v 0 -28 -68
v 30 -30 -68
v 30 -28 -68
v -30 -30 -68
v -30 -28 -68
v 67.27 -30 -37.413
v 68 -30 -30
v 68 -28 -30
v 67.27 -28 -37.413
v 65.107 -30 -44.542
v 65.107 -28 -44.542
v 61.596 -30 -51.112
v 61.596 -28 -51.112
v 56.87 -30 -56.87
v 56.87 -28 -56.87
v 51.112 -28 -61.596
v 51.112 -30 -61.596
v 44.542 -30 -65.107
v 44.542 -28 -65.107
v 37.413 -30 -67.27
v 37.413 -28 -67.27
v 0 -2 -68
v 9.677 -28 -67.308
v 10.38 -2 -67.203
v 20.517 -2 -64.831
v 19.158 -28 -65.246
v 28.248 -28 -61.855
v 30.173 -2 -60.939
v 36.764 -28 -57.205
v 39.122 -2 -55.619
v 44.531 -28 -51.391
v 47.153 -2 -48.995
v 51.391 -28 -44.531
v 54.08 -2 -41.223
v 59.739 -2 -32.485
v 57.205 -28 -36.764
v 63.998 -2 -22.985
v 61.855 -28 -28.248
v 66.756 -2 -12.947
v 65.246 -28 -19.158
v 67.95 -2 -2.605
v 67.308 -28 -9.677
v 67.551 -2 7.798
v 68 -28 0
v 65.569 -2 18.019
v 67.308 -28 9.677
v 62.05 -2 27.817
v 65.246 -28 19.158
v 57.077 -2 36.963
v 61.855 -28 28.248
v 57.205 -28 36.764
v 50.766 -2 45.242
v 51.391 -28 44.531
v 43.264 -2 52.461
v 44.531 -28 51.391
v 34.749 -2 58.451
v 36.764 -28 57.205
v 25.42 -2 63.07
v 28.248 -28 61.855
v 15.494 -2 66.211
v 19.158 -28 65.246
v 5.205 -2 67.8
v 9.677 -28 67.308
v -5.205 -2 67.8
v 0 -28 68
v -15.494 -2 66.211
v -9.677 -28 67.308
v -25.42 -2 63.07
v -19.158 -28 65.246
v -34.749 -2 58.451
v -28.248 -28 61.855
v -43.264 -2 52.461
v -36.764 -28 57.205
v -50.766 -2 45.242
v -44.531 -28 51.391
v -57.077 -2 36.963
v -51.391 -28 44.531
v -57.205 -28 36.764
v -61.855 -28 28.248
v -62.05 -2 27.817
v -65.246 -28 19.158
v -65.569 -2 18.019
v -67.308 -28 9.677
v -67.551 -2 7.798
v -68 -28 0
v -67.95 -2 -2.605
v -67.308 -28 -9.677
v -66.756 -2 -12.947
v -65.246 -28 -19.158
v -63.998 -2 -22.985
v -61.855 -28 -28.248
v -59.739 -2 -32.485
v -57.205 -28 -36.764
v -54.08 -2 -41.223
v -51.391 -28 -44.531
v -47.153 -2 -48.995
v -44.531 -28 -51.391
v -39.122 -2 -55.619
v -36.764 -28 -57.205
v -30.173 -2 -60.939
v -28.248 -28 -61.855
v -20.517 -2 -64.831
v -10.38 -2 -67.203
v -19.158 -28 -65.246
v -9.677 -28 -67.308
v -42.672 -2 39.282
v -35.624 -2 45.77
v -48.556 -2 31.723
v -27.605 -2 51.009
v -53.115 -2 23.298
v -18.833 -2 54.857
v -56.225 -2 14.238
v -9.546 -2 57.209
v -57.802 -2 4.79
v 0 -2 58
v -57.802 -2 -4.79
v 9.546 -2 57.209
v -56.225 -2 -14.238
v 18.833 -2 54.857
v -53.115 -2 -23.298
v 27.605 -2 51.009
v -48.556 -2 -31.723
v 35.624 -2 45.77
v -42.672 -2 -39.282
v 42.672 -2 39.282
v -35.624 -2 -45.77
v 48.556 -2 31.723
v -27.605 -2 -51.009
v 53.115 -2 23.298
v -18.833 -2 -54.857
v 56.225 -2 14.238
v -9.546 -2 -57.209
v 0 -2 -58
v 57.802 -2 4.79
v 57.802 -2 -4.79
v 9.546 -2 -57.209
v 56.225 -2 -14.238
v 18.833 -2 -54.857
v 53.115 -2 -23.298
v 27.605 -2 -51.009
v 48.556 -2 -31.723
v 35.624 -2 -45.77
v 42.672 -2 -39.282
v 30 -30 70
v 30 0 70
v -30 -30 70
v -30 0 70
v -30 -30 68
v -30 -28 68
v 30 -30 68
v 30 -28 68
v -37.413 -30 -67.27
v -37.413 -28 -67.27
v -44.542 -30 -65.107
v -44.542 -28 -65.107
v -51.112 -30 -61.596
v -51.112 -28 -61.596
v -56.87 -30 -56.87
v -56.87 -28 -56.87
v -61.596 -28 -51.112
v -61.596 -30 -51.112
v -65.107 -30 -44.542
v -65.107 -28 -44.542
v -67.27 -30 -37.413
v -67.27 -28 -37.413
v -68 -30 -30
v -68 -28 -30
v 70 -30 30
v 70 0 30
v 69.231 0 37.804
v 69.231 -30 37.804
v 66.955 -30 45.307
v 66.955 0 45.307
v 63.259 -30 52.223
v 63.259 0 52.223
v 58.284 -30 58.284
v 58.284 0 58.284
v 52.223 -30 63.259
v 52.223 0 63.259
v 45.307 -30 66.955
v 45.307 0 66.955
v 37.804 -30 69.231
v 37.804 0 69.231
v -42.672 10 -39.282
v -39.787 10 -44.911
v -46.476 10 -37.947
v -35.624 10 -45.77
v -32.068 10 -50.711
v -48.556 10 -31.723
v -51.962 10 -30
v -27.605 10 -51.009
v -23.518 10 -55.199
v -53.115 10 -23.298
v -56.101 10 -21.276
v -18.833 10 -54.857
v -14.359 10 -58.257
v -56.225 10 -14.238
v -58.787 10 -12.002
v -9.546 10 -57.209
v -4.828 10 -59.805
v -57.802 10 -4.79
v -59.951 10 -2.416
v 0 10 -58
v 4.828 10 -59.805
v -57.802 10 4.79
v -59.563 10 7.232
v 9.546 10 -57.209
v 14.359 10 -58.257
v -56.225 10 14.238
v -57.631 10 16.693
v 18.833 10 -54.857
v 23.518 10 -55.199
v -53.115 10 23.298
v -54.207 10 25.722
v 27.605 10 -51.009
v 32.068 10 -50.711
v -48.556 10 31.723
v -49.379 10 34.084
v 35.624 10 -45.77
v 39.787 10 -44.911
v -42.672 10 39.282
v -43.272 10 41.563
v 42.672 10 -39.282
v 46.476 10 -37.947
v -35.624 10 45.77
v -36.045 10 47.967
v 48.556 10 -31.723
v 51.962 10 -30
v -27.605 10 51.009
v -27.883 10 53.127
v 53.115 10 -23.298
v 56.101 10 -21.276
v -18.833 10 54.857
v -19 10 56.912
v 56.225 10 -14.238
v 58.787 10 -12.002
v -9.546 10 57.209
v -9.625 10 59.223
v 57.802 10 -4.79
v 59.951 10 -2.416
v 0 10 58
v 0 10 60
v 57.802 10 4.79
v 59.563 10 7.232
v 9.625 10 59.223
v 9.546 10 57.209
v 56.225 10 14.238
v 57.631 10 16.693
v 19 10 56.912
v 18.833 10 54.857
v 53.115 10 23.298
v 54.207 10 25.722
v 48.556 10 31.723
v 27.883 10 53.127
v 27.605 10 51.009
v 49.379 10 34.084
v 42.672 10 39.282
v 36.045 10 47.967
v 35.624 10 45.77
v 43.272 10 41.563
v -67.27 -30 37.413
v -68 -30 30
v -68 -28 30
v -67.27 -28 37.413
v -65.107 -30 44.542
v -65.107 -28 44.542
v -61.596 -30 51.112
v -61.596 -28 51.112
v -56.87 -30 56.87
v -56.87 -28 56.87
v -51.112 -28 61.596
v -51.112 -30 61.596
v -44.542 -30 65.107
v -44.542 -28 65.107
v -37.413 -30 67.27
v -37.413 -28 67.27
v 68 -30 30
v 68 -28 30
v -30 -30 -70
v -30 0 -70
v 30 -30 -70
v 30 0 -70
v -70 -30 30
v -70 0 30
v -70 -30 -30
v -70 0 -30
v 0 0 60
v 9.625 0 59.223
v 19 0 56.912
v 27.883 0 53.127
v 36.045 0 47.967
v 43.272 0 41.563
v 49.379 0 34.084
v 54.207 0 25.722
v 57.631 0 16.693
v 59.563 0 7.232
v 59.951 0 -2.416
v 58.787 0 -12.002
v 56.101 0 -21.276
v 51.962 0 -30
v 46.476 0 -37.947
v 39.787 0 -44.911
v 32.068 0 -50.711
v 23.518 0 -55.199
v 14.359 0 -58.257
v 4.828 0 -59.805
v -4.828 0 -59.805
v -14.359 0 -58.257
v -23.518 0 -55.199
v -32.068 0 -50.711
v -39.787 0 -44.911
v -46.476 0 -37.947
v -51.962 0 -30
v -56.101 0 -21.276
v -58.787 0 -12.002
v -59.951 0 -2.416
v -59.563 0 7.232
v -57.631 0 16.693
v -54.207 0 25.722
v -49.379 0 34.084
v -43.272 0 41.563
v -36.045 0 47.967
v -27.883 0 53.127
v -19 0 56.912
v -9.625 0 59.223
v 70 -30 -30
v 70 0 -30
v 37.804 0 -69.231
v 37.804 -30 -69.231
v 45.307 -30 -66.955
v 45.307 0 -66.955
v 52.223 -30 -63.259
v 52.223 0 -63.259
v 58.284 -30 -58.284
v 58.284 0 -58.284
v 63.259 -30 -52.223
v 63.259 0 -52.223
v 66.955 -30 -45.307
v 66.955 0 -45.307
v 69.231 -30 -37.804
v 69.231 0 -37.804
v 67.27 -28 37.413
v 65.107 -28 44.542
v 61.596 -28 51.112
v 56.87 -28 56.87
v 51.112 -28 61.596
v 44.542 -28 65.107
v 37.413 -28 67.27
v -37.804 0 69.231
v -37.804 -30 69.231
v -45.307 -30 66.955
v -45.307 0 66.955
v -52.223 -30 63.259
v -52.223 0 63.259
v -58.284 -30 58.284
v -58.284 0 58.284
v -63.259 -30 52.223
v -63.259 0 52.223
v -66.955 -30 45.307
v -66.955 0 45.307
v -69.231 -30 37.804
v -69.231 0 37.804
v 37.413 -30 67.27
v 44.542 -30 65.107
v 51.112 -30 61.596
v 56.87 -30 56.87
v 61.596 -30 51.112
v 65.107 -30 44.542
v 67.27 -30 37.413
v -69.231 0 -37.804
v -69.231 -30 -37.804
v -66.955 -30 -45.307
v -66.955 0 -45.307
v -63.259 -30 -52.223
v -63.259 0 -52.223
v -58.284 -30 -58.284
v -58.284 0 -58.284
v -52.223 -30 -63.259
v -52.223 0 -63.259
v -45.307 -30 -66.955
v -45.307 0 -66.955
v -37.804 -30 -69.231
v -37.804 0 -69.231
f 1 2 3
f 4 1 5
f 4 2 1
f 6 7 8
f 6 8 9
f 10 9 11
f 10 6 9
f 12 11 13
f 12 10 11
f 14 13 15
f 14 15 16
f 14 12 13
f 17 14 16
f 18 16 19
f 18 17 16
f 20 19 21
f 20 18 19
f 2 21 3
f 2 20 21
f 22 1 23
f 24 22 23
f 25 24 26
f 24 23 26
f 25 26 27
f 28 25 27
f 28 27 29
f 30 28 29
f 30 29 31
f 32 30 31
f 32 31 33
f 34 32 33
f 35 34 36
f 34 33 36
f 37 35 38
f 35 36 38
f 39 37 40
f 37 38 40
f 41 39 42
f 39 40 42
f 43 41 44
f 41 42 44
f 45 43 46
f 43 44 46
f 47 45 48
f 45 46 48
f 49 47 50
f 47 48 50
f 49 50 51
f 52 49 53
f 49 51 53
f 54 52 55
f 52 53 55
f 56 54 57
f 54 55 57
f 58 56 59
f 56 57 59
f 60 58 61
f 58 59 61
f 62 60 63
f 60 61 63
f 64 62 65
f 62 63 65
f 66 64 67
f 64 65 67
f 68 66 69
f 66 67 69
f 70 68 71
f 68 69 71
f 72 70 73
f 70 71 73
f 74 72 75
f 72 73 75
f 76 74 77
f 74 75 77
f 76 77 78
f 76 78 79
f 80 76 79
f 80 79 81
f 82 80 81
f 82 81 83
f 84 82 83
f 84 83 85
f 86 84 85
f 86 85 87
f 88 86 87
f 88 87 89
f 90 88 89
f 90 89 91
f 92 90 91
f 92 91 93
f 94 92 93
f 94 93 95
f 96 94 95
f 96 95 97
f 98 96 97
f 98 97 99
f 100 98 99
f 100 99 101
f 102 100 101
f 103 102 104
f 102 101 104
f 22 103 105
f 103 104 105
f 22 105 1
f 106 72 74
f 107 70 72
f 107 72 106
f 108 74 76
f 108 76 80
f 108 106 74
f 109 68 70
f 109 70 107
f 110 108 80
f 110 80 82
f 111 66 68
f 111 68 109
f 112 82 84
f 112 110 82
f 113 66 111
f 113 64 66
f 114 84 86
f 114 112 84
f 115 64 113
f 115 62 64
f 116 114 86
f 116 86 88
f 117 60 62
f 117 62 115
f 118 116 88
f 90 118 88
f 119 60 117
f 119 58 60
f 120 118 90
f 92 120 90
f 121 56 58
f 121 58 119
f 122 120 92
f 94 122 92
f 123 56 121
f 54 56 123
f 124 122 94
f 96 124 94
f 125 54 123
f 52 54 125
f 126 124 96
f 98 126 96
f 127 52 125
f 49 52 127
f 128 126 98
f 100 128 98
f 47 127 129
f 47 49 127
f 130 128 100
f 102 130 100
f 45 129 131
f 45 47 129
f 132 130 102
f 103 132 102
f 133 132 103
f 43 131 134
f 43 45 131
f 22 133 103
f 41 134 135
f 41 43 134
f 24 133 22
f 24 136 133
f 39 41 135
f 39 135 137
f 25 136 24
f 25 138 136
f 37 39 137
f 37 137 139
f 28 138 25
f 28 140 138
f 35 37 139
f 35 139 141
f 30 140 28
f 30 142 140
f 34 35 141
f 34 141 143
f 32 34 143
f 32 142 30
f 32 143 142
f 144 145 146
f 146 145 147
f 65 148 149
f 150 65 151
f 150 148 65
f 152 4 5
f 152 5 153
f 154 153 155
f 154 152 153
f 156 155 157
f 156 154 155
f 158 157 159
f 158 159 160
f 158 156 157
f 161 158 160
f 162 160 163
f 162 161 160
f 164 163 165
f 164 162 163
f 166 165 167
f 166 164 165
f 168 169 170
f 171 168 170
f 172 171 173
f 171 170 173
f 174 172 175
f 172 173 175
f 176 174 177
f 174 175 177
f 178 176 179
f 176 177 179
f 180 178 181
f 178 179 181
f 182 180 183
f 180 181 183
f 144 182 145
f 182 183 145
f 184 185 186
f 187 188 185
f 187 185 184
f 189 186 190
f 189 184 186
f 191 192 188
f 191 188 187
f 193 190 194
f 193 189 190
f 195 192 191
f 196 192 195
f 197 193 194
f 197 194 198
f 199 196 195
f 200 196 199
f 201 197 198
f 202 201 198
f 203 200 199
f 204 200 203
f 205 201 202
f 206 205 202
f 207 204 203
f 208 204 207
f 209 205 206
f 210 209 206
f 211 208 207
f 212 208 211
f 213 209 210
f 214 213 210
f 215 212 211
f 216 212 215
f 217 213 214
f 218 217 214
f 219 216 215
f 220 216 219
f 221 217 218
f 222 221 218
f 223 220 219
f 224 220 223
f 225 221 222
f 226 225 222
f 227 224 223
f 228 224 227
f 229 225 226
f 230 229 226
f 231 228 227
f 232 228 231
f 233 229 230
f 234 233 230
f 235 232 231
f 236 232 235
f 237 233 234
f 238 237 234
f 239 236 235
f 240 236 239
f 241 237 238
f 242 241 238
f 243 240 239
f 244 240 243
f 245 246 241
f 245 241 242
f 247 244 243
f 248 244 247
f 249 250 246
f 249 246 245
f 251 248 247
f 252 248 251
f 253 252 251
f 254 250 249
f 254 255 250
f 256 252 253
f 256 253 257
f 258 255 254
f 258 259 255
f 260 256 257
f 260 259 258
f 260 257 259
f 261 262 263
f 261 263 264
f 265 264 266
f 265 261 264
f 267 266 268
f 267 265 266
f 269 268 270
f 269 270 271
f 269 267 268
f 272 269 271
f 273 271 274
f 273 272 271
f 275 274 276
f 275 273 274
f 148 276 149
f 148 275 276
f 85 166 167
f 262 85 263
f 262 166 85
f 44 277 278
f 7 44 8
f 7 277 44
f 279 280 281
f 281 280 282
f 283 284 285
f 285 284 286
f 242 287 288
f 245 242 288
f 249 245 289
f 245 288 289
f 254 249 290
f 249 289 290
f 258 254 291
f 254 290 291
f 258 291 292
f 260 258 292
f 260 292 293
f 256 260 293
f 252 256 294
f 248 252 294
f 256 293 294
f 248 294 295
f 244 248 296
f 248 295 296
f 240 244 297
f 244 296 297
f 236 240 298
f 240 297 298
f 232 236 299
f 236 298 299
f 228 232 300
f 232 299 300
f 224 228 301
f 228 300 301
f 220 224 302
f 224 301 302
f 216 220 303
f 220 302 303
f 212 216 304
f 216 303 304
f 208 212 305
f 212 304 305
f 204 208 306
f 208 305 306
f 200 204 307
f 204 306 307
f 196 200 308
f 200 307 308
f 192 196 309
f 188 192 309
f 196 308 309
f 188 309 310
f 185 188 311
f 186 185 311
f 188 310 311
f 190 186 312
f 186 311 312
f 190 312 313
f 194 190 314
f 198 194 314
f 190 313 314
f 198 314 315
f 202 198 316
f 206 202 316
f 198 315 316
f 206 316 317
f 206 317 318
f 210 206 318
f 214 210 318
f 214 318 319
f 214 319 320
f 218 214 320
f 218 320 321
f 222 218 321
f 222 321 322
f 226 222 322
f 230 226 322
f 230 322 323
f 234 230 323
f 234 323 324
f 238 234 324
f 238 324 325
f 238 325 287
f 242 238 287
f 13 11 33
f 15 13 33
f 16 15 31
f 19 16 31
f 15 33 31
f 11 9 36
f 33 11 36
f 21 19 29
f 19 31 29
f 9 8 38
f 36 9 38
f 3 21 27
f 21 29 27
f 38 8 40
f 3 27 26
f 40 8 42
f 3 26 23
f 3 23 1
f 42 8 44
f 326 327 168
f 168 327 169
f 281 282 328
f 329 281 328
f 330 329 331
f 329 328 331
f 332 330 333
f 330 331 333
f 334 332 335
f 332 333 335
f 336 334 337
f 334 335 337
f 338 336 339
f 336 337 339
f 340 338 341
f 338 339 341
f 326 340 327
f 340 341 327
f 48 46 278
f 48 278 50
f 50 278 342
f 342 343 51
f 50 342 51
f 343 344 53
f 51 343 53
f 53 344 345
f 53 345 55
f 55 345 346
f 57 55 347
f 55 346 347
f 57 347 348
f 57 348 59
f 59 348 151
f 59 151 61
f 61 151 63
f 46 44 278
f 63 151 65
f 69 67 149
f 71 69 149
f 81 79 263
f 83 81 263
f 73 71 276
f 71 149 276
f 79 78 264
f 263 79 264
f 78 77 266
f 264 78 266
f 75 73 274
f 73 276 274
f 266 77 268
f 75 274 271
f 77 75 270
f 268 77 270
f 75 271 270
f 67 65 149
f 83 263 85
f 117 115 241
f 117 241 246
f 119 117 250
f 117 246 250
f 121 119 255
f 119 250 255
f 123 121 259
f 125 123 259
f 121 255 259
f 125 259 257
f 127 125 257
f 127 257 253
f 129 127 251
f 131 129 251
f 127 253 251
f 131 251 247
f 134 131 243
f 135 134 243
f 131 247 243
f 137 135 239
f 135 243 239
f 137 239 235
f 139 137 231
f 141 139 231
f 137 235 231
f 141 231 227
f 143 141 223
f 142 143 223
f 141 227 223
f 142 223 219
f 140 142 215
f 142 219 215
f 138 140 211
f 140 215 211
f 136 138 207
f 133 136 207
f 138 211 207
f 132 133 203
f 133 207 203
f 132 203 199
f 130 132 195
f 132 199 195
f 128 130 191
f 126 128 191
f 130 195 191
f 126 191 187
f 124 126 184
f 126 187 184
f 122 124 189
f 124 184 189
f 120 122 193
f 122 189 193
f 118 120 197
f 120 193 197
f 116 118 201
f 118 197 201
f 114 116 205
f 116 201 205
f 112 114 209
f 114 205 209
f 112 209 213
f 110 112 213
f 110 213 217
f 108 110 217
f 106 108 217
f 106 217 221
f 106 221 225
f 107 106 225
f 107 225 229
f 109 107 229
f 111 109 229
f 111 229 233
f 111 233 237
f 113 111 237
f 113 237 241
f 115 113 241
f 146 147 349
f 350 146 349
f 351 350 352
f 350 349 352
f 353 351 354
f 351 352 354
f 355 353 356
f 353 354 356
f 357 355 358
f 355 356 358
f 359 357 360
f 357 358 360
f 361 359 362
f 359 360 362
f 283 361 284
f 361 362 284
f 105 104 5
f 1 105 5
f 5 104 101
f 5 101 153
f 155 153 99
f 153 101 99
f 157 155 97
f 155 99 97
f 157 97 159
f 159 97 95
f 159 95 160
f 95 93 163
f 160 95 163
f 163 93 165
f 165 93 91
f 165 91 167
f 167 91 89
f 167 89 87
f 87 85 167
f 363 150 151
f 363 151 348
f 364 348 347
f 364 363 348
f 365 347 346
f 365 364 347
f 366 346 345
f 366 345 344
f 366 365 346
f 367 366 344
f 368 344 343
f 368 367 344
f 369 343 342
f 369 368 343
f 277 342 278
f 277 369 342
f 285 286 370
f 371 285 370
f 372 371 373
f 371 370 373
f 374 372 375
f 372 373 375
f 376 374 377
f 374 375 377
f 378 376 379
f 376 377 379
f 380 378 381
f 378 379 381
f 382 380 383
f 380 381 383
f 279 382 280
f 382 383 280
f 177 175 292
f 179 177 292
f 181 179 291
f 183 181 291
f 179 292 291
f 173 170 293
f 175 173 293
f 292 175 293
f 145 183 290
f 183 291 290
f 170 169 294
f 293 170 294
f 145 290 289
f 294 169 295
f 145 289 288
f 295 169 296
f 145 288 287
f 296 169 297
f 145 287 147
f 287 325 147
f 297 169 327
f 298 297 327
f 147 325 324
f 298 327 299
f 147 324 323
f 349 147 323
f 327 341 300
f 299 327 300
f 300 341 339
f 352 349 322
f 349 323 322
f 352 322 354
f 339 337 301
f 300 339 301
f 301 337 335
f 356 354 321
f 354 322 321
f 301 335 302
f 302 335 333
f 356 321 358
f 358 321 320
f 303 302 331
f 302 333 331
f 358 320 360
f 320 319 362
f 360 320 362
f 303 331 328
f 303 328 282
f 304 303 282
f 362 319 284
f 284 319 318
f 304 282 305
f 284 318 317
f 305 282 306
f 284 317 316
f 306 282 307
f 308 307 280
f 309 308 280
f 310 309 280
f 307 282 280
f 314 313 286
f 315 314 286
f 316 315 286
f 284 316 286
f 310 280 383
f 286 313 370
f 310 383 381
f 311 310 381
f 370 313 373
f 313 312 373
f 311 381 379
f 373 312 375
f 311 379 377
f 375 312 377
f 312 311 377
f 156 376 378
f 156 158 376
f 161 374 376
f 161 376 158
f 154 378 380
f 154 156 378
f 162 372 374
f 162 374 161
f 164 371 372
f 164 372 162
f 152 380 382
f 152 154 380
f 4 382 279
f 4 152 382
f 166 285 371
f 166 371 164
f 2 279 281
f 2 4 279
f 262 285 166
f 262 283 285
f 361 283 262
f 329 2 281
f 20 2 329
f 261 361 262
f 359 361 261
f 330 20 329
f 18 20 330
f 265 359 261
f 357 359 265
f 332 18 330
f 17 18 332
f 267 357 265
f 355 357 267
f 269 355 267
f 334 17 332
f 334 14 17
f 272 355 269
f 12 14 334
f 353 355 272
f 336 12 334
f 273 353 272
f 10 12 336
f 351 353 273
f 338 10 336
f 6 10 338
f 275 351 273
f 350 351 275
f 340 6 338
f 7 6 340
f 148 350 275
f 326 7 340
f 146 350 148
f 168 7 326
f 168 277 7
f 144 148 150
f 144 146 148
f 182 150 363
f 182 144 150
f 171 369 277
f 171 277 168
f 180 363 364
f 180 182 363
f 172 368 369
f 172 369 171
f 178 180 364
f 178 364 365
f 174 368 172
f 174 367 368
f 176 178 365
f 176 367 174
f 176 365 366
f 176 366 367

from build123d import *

# Parameters (mm, degrees)
BOSS_EXTRUDE1_DEPTH = 40
SKETCH2_R           = 60
BOSS_EXTRUDE2_DEPTH = 10
SKETCH3_R           = 58
CUT_EXTRUDE1_DEPTH  = 12
SKETCH5_R           = 68
CUT_EXTRUDE3_DEPTH  = 38
SKETCH7_W           = 152.426139127
SKETCH7_H           = 144.716969628
CUT_EXTRUDE4_DEPTH  = 10
CUT_EXTRUDE6_DEPTH  = 2


with BuildPart() as part:
    # Sketch1 → Boss-Extrude1 (new body)
    with BuildSketch(Plane(origin=(0, 0, 0), x_dir=(1, 0, 0), z_dir=(0, 1, 0))):
        with BuildLine():
            Line((-30, 70), (30, 70))
            ThreePointArc((30, 70), (58.284271247, 58.284271247), (70, 30))
            Line((70, 30), (70, -30))
            ThreePointArc((70, -30), (58.284271247, -58.284271247), (30, -70))
            Line((30, -70), (-30, -70))
            ThreePointArc((-30, -70), (-58.284271247, -58.284271247), (-70, -30))
            Line((-70, -30), (-70, 30))
            ThreePointArc((-70, 30), (-58.284271247, 58.284271247), (-30, 70))
        make_face()
    extrude(amount=-BOSS_EXTRUDE1_DEPTH)

    # Sketch2 → Boss-Extrude2 (add)
    with BuildSketch(Plane(origin=(0, 0, 0), x_dir=(1, 0, 0), z_dir=(0, 1, 0))):
        with Locations(Location((0, 0, 0), (0, 0, 270))):
            Circle(SKETCH2_R)
    extrude(amount=BOSS_EXTRUDE2_DEPTH)

    # Sketch3 → Cut-Extrude1 (cut)
    with BuildSketch(Plane(origin=(0, 10, 0), x_dir=(1, 0, 0), z_dir=(0, 1, 0))):
        with Locations(Location((0, 0, 0), (0, 0, 270))):
            Circle(SKETCH3_R)
    extrude(amount=-CUT_EXTRUDE1_DEPTH, mode=Mode.SUBTRACT)

    # Sketch5 → Cut-Extrude3 (cut)
    with BuildSketch(Plane.XZ.offset(40)):
        with Locations(Location((0, 0, 0), (0, 0, 270))):
            Circle(SKETCH5_R)
    extrude(amount=-CUT_EXTRUDE3_DEPTH, mode=Mode.SUBTRACT)

    # Sketch7 → Cut-Extrude4 (cut)
    with BuildSketch(Plane.XZ.offset(40)):
        with Locations((-0.48756258, -1.365678106)):
            Rectangle(SKETCH7_W, SKETCH7_H)
    extrude(amount=-CUT_EXTRUDE4_DEPTH, mode=Mode.SUBTRACT)

    # Sketch8 → Cut-Extrude6 (cut)
    with BuildSketch(Plane.XZ.offset(30)):
        with BuildLine():
            Line((68, 30), (68, -30))
            ThreePointArc((68, -30), (56.870057685, -56.870057685), (30, -68))
            Line((30, -68), (-30, -68))
            ThreePointArc((-30, -68), (-56.870057685, -56.870057685), (-68, -30))
            Line((-68, -30), (-68, 30))
            ThreePointArc((-68, 30), (-56.870057685, 56.870057685), (-30, 68))
            Line((-30, 68), (30, 68))
            ThreePointArc((30, 68), (56.870057685, 56.870057685), (68, 30))
        make_face()
    extrude(amount=-CUT_EXTRUDE6_DEPTH, mode=Mode.SUBTRACT)


solid = part.part
